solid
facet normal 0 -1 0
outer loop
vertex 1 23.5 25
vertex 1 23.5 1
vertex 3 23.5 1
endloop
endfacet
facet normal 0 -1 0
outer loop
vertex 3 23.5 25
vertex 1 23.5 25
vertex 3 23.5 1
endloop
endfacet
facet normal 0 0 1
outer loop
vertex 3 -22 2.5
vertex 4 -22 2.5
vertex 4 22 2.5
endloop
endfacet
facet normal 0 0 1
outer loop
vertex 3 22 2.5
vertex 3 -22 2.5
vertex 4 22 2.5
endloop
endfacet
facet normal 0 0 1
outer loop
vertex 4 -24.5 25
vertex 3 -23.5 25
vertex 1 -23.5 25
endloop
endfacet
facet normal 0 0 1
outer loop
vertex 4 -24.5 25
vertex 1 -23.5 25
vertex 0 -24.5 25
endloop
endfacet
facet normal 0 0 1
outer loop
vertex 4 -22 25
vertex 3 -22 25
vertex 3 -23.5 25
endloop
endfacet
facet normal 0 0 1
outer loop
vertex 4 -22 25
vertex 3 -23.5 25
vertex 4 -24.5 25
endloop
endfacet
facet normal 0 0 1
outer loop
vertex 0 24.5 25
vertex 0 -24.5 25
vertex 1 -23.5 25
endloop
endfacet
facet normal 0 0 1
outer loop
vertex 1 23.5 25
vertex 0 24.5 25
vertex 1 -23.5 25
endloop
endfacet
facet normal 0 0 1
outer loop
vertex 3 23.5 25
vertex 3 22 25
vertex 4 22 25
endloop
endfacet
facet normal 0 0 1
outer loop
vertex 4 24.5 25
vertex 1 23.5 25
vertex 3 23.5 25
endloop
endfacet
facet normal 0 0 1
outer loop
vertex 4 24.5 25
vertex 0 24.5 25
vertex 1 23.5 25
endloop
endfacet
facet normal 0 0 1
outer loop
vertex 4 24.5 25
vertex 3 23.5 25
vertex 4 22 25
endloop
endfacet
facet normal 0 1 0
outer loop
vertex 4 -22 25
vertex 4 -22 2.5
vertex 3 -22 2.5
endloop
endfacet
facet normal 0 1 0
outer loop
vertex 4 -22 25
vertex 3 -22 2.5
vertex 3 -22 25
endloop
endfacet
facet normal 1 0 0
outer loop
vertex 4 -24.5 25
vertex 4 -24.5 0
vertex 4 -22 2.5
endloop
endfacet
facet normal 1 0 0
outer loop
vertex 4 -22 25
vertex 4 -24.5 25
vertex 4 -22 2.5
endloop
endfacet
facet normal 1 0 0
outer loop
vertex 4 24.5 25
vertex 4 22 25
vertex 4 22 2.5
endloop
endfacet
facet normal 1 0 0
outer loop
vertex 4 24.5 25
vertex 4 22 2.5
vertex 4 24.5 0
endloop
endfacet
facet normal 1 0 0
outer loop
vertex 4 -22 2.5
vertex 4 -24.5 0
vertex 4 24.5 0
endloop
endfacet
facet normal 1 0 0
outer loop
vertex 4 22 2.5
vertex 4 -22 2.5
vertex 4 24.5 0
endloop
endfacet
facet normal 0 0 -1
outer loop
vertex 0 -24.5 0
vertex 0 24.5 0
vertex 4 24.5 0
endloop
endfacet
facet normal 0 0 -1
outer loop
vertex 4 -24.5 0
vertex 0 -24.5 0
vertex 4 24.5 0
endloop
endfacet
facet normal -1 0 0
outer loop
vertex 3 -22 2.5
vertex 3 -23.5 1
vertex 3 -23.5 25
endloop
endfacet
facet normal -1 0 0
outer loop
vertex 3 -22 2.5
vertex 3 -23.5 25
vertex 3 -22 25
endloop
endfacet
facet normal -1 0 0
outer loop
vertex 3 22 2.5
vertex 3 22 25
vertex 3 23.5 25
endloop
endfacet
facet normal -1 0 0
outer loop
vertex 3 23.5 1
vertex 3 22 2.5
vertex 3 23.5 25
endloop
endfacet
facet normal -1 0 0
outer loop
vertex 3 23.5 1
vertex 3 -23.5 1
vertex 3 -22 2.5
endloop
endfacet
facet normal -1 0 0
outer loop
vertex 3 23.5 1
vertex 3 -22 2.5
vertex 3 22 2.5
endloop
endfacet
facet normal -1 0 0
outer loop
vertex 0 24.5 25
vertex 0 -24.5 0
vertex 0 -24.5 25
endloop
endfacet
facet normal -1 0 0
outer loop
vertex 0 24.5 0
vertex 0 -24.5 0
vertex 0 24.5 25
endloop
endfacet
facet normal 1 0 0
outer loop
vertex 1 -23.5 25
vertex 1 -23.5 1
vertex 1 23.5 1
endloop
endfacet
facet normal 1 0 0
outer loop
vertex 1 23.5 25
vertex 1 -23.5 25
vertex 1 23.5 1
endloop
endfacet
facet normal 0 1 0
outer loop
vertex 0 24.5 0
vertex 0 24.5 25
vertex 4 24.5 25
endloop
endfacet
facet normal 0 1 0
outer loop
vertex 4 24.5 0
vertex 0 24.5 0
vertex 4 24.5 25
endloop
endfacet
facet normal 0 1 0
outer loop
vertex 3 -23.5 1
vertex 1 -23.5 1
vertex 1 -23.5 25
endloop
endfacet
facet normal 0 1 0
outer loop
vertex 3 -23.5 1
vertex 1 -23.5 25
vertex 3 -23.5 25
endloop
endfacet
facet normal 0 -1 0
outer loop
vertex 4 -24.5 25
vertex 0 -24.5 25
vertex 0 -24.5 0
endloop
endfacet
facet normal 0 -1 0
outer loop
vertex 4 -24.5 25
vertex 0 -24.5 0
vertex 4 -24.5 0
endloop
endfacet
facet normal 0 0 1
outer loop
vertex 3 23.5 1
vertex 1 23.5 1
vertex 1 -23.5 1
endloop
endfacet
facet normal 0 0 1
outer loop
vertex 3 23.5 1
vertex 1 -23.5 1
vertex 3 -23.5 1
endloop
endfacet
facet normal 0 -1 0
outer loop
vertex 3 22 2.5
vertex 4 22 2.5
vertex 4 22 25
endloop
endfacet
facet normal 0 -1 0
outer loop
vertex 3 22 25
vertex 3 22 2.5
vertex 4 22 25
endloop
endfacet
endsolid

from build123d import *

# Parameters (mm, degrees)
F0_W     = 3.9999993443
F0_H     = 48.9999993443
F0_W_2   = 2
F0_H_2   = 47
F1_DEPTH = 25
F2_W     = 43.9999993443
F2_H     = 22.5
F3_DEPTH = 2
F4_DEPTH = 1


# Not quite as in the source:
# - a feature names something its author has since deleted; it is built from what else it names


with BuildPart() as f1:
    # F0 (on Top) → F1 (new body)
    with BuildSketch(Plane.XY):
        with Locations((1.9999996722, 0)):
            Rectangle(F0_W, F0_H)
        with Locations((1.9999996722, 0)):
            Rectangle(F0_W_2, F0_H_2, mode=Mode.SUBTRACT)
    extrude(amount=F1_DEPTH)

    # F2 (on face) → F3 (cut)
    with BuildSketch(Plane.YZ.offset(3.9999993443)):
        with Locations((0, 13.75)):
            Rectangle(F2_W, F2_H)
    extrude(amount=-F3_DEPTH, mode=Mode.SUBTRACT)

    # F0 (on Top) → F4 (join)
    with BuildSketch(Plane.XY):
        with Locations((1.9999996722, 0)):
            Rectangle(F0_W_2, F0_H_2)
    extrude(amount=F4_DEPTH)


solid = f1.part
